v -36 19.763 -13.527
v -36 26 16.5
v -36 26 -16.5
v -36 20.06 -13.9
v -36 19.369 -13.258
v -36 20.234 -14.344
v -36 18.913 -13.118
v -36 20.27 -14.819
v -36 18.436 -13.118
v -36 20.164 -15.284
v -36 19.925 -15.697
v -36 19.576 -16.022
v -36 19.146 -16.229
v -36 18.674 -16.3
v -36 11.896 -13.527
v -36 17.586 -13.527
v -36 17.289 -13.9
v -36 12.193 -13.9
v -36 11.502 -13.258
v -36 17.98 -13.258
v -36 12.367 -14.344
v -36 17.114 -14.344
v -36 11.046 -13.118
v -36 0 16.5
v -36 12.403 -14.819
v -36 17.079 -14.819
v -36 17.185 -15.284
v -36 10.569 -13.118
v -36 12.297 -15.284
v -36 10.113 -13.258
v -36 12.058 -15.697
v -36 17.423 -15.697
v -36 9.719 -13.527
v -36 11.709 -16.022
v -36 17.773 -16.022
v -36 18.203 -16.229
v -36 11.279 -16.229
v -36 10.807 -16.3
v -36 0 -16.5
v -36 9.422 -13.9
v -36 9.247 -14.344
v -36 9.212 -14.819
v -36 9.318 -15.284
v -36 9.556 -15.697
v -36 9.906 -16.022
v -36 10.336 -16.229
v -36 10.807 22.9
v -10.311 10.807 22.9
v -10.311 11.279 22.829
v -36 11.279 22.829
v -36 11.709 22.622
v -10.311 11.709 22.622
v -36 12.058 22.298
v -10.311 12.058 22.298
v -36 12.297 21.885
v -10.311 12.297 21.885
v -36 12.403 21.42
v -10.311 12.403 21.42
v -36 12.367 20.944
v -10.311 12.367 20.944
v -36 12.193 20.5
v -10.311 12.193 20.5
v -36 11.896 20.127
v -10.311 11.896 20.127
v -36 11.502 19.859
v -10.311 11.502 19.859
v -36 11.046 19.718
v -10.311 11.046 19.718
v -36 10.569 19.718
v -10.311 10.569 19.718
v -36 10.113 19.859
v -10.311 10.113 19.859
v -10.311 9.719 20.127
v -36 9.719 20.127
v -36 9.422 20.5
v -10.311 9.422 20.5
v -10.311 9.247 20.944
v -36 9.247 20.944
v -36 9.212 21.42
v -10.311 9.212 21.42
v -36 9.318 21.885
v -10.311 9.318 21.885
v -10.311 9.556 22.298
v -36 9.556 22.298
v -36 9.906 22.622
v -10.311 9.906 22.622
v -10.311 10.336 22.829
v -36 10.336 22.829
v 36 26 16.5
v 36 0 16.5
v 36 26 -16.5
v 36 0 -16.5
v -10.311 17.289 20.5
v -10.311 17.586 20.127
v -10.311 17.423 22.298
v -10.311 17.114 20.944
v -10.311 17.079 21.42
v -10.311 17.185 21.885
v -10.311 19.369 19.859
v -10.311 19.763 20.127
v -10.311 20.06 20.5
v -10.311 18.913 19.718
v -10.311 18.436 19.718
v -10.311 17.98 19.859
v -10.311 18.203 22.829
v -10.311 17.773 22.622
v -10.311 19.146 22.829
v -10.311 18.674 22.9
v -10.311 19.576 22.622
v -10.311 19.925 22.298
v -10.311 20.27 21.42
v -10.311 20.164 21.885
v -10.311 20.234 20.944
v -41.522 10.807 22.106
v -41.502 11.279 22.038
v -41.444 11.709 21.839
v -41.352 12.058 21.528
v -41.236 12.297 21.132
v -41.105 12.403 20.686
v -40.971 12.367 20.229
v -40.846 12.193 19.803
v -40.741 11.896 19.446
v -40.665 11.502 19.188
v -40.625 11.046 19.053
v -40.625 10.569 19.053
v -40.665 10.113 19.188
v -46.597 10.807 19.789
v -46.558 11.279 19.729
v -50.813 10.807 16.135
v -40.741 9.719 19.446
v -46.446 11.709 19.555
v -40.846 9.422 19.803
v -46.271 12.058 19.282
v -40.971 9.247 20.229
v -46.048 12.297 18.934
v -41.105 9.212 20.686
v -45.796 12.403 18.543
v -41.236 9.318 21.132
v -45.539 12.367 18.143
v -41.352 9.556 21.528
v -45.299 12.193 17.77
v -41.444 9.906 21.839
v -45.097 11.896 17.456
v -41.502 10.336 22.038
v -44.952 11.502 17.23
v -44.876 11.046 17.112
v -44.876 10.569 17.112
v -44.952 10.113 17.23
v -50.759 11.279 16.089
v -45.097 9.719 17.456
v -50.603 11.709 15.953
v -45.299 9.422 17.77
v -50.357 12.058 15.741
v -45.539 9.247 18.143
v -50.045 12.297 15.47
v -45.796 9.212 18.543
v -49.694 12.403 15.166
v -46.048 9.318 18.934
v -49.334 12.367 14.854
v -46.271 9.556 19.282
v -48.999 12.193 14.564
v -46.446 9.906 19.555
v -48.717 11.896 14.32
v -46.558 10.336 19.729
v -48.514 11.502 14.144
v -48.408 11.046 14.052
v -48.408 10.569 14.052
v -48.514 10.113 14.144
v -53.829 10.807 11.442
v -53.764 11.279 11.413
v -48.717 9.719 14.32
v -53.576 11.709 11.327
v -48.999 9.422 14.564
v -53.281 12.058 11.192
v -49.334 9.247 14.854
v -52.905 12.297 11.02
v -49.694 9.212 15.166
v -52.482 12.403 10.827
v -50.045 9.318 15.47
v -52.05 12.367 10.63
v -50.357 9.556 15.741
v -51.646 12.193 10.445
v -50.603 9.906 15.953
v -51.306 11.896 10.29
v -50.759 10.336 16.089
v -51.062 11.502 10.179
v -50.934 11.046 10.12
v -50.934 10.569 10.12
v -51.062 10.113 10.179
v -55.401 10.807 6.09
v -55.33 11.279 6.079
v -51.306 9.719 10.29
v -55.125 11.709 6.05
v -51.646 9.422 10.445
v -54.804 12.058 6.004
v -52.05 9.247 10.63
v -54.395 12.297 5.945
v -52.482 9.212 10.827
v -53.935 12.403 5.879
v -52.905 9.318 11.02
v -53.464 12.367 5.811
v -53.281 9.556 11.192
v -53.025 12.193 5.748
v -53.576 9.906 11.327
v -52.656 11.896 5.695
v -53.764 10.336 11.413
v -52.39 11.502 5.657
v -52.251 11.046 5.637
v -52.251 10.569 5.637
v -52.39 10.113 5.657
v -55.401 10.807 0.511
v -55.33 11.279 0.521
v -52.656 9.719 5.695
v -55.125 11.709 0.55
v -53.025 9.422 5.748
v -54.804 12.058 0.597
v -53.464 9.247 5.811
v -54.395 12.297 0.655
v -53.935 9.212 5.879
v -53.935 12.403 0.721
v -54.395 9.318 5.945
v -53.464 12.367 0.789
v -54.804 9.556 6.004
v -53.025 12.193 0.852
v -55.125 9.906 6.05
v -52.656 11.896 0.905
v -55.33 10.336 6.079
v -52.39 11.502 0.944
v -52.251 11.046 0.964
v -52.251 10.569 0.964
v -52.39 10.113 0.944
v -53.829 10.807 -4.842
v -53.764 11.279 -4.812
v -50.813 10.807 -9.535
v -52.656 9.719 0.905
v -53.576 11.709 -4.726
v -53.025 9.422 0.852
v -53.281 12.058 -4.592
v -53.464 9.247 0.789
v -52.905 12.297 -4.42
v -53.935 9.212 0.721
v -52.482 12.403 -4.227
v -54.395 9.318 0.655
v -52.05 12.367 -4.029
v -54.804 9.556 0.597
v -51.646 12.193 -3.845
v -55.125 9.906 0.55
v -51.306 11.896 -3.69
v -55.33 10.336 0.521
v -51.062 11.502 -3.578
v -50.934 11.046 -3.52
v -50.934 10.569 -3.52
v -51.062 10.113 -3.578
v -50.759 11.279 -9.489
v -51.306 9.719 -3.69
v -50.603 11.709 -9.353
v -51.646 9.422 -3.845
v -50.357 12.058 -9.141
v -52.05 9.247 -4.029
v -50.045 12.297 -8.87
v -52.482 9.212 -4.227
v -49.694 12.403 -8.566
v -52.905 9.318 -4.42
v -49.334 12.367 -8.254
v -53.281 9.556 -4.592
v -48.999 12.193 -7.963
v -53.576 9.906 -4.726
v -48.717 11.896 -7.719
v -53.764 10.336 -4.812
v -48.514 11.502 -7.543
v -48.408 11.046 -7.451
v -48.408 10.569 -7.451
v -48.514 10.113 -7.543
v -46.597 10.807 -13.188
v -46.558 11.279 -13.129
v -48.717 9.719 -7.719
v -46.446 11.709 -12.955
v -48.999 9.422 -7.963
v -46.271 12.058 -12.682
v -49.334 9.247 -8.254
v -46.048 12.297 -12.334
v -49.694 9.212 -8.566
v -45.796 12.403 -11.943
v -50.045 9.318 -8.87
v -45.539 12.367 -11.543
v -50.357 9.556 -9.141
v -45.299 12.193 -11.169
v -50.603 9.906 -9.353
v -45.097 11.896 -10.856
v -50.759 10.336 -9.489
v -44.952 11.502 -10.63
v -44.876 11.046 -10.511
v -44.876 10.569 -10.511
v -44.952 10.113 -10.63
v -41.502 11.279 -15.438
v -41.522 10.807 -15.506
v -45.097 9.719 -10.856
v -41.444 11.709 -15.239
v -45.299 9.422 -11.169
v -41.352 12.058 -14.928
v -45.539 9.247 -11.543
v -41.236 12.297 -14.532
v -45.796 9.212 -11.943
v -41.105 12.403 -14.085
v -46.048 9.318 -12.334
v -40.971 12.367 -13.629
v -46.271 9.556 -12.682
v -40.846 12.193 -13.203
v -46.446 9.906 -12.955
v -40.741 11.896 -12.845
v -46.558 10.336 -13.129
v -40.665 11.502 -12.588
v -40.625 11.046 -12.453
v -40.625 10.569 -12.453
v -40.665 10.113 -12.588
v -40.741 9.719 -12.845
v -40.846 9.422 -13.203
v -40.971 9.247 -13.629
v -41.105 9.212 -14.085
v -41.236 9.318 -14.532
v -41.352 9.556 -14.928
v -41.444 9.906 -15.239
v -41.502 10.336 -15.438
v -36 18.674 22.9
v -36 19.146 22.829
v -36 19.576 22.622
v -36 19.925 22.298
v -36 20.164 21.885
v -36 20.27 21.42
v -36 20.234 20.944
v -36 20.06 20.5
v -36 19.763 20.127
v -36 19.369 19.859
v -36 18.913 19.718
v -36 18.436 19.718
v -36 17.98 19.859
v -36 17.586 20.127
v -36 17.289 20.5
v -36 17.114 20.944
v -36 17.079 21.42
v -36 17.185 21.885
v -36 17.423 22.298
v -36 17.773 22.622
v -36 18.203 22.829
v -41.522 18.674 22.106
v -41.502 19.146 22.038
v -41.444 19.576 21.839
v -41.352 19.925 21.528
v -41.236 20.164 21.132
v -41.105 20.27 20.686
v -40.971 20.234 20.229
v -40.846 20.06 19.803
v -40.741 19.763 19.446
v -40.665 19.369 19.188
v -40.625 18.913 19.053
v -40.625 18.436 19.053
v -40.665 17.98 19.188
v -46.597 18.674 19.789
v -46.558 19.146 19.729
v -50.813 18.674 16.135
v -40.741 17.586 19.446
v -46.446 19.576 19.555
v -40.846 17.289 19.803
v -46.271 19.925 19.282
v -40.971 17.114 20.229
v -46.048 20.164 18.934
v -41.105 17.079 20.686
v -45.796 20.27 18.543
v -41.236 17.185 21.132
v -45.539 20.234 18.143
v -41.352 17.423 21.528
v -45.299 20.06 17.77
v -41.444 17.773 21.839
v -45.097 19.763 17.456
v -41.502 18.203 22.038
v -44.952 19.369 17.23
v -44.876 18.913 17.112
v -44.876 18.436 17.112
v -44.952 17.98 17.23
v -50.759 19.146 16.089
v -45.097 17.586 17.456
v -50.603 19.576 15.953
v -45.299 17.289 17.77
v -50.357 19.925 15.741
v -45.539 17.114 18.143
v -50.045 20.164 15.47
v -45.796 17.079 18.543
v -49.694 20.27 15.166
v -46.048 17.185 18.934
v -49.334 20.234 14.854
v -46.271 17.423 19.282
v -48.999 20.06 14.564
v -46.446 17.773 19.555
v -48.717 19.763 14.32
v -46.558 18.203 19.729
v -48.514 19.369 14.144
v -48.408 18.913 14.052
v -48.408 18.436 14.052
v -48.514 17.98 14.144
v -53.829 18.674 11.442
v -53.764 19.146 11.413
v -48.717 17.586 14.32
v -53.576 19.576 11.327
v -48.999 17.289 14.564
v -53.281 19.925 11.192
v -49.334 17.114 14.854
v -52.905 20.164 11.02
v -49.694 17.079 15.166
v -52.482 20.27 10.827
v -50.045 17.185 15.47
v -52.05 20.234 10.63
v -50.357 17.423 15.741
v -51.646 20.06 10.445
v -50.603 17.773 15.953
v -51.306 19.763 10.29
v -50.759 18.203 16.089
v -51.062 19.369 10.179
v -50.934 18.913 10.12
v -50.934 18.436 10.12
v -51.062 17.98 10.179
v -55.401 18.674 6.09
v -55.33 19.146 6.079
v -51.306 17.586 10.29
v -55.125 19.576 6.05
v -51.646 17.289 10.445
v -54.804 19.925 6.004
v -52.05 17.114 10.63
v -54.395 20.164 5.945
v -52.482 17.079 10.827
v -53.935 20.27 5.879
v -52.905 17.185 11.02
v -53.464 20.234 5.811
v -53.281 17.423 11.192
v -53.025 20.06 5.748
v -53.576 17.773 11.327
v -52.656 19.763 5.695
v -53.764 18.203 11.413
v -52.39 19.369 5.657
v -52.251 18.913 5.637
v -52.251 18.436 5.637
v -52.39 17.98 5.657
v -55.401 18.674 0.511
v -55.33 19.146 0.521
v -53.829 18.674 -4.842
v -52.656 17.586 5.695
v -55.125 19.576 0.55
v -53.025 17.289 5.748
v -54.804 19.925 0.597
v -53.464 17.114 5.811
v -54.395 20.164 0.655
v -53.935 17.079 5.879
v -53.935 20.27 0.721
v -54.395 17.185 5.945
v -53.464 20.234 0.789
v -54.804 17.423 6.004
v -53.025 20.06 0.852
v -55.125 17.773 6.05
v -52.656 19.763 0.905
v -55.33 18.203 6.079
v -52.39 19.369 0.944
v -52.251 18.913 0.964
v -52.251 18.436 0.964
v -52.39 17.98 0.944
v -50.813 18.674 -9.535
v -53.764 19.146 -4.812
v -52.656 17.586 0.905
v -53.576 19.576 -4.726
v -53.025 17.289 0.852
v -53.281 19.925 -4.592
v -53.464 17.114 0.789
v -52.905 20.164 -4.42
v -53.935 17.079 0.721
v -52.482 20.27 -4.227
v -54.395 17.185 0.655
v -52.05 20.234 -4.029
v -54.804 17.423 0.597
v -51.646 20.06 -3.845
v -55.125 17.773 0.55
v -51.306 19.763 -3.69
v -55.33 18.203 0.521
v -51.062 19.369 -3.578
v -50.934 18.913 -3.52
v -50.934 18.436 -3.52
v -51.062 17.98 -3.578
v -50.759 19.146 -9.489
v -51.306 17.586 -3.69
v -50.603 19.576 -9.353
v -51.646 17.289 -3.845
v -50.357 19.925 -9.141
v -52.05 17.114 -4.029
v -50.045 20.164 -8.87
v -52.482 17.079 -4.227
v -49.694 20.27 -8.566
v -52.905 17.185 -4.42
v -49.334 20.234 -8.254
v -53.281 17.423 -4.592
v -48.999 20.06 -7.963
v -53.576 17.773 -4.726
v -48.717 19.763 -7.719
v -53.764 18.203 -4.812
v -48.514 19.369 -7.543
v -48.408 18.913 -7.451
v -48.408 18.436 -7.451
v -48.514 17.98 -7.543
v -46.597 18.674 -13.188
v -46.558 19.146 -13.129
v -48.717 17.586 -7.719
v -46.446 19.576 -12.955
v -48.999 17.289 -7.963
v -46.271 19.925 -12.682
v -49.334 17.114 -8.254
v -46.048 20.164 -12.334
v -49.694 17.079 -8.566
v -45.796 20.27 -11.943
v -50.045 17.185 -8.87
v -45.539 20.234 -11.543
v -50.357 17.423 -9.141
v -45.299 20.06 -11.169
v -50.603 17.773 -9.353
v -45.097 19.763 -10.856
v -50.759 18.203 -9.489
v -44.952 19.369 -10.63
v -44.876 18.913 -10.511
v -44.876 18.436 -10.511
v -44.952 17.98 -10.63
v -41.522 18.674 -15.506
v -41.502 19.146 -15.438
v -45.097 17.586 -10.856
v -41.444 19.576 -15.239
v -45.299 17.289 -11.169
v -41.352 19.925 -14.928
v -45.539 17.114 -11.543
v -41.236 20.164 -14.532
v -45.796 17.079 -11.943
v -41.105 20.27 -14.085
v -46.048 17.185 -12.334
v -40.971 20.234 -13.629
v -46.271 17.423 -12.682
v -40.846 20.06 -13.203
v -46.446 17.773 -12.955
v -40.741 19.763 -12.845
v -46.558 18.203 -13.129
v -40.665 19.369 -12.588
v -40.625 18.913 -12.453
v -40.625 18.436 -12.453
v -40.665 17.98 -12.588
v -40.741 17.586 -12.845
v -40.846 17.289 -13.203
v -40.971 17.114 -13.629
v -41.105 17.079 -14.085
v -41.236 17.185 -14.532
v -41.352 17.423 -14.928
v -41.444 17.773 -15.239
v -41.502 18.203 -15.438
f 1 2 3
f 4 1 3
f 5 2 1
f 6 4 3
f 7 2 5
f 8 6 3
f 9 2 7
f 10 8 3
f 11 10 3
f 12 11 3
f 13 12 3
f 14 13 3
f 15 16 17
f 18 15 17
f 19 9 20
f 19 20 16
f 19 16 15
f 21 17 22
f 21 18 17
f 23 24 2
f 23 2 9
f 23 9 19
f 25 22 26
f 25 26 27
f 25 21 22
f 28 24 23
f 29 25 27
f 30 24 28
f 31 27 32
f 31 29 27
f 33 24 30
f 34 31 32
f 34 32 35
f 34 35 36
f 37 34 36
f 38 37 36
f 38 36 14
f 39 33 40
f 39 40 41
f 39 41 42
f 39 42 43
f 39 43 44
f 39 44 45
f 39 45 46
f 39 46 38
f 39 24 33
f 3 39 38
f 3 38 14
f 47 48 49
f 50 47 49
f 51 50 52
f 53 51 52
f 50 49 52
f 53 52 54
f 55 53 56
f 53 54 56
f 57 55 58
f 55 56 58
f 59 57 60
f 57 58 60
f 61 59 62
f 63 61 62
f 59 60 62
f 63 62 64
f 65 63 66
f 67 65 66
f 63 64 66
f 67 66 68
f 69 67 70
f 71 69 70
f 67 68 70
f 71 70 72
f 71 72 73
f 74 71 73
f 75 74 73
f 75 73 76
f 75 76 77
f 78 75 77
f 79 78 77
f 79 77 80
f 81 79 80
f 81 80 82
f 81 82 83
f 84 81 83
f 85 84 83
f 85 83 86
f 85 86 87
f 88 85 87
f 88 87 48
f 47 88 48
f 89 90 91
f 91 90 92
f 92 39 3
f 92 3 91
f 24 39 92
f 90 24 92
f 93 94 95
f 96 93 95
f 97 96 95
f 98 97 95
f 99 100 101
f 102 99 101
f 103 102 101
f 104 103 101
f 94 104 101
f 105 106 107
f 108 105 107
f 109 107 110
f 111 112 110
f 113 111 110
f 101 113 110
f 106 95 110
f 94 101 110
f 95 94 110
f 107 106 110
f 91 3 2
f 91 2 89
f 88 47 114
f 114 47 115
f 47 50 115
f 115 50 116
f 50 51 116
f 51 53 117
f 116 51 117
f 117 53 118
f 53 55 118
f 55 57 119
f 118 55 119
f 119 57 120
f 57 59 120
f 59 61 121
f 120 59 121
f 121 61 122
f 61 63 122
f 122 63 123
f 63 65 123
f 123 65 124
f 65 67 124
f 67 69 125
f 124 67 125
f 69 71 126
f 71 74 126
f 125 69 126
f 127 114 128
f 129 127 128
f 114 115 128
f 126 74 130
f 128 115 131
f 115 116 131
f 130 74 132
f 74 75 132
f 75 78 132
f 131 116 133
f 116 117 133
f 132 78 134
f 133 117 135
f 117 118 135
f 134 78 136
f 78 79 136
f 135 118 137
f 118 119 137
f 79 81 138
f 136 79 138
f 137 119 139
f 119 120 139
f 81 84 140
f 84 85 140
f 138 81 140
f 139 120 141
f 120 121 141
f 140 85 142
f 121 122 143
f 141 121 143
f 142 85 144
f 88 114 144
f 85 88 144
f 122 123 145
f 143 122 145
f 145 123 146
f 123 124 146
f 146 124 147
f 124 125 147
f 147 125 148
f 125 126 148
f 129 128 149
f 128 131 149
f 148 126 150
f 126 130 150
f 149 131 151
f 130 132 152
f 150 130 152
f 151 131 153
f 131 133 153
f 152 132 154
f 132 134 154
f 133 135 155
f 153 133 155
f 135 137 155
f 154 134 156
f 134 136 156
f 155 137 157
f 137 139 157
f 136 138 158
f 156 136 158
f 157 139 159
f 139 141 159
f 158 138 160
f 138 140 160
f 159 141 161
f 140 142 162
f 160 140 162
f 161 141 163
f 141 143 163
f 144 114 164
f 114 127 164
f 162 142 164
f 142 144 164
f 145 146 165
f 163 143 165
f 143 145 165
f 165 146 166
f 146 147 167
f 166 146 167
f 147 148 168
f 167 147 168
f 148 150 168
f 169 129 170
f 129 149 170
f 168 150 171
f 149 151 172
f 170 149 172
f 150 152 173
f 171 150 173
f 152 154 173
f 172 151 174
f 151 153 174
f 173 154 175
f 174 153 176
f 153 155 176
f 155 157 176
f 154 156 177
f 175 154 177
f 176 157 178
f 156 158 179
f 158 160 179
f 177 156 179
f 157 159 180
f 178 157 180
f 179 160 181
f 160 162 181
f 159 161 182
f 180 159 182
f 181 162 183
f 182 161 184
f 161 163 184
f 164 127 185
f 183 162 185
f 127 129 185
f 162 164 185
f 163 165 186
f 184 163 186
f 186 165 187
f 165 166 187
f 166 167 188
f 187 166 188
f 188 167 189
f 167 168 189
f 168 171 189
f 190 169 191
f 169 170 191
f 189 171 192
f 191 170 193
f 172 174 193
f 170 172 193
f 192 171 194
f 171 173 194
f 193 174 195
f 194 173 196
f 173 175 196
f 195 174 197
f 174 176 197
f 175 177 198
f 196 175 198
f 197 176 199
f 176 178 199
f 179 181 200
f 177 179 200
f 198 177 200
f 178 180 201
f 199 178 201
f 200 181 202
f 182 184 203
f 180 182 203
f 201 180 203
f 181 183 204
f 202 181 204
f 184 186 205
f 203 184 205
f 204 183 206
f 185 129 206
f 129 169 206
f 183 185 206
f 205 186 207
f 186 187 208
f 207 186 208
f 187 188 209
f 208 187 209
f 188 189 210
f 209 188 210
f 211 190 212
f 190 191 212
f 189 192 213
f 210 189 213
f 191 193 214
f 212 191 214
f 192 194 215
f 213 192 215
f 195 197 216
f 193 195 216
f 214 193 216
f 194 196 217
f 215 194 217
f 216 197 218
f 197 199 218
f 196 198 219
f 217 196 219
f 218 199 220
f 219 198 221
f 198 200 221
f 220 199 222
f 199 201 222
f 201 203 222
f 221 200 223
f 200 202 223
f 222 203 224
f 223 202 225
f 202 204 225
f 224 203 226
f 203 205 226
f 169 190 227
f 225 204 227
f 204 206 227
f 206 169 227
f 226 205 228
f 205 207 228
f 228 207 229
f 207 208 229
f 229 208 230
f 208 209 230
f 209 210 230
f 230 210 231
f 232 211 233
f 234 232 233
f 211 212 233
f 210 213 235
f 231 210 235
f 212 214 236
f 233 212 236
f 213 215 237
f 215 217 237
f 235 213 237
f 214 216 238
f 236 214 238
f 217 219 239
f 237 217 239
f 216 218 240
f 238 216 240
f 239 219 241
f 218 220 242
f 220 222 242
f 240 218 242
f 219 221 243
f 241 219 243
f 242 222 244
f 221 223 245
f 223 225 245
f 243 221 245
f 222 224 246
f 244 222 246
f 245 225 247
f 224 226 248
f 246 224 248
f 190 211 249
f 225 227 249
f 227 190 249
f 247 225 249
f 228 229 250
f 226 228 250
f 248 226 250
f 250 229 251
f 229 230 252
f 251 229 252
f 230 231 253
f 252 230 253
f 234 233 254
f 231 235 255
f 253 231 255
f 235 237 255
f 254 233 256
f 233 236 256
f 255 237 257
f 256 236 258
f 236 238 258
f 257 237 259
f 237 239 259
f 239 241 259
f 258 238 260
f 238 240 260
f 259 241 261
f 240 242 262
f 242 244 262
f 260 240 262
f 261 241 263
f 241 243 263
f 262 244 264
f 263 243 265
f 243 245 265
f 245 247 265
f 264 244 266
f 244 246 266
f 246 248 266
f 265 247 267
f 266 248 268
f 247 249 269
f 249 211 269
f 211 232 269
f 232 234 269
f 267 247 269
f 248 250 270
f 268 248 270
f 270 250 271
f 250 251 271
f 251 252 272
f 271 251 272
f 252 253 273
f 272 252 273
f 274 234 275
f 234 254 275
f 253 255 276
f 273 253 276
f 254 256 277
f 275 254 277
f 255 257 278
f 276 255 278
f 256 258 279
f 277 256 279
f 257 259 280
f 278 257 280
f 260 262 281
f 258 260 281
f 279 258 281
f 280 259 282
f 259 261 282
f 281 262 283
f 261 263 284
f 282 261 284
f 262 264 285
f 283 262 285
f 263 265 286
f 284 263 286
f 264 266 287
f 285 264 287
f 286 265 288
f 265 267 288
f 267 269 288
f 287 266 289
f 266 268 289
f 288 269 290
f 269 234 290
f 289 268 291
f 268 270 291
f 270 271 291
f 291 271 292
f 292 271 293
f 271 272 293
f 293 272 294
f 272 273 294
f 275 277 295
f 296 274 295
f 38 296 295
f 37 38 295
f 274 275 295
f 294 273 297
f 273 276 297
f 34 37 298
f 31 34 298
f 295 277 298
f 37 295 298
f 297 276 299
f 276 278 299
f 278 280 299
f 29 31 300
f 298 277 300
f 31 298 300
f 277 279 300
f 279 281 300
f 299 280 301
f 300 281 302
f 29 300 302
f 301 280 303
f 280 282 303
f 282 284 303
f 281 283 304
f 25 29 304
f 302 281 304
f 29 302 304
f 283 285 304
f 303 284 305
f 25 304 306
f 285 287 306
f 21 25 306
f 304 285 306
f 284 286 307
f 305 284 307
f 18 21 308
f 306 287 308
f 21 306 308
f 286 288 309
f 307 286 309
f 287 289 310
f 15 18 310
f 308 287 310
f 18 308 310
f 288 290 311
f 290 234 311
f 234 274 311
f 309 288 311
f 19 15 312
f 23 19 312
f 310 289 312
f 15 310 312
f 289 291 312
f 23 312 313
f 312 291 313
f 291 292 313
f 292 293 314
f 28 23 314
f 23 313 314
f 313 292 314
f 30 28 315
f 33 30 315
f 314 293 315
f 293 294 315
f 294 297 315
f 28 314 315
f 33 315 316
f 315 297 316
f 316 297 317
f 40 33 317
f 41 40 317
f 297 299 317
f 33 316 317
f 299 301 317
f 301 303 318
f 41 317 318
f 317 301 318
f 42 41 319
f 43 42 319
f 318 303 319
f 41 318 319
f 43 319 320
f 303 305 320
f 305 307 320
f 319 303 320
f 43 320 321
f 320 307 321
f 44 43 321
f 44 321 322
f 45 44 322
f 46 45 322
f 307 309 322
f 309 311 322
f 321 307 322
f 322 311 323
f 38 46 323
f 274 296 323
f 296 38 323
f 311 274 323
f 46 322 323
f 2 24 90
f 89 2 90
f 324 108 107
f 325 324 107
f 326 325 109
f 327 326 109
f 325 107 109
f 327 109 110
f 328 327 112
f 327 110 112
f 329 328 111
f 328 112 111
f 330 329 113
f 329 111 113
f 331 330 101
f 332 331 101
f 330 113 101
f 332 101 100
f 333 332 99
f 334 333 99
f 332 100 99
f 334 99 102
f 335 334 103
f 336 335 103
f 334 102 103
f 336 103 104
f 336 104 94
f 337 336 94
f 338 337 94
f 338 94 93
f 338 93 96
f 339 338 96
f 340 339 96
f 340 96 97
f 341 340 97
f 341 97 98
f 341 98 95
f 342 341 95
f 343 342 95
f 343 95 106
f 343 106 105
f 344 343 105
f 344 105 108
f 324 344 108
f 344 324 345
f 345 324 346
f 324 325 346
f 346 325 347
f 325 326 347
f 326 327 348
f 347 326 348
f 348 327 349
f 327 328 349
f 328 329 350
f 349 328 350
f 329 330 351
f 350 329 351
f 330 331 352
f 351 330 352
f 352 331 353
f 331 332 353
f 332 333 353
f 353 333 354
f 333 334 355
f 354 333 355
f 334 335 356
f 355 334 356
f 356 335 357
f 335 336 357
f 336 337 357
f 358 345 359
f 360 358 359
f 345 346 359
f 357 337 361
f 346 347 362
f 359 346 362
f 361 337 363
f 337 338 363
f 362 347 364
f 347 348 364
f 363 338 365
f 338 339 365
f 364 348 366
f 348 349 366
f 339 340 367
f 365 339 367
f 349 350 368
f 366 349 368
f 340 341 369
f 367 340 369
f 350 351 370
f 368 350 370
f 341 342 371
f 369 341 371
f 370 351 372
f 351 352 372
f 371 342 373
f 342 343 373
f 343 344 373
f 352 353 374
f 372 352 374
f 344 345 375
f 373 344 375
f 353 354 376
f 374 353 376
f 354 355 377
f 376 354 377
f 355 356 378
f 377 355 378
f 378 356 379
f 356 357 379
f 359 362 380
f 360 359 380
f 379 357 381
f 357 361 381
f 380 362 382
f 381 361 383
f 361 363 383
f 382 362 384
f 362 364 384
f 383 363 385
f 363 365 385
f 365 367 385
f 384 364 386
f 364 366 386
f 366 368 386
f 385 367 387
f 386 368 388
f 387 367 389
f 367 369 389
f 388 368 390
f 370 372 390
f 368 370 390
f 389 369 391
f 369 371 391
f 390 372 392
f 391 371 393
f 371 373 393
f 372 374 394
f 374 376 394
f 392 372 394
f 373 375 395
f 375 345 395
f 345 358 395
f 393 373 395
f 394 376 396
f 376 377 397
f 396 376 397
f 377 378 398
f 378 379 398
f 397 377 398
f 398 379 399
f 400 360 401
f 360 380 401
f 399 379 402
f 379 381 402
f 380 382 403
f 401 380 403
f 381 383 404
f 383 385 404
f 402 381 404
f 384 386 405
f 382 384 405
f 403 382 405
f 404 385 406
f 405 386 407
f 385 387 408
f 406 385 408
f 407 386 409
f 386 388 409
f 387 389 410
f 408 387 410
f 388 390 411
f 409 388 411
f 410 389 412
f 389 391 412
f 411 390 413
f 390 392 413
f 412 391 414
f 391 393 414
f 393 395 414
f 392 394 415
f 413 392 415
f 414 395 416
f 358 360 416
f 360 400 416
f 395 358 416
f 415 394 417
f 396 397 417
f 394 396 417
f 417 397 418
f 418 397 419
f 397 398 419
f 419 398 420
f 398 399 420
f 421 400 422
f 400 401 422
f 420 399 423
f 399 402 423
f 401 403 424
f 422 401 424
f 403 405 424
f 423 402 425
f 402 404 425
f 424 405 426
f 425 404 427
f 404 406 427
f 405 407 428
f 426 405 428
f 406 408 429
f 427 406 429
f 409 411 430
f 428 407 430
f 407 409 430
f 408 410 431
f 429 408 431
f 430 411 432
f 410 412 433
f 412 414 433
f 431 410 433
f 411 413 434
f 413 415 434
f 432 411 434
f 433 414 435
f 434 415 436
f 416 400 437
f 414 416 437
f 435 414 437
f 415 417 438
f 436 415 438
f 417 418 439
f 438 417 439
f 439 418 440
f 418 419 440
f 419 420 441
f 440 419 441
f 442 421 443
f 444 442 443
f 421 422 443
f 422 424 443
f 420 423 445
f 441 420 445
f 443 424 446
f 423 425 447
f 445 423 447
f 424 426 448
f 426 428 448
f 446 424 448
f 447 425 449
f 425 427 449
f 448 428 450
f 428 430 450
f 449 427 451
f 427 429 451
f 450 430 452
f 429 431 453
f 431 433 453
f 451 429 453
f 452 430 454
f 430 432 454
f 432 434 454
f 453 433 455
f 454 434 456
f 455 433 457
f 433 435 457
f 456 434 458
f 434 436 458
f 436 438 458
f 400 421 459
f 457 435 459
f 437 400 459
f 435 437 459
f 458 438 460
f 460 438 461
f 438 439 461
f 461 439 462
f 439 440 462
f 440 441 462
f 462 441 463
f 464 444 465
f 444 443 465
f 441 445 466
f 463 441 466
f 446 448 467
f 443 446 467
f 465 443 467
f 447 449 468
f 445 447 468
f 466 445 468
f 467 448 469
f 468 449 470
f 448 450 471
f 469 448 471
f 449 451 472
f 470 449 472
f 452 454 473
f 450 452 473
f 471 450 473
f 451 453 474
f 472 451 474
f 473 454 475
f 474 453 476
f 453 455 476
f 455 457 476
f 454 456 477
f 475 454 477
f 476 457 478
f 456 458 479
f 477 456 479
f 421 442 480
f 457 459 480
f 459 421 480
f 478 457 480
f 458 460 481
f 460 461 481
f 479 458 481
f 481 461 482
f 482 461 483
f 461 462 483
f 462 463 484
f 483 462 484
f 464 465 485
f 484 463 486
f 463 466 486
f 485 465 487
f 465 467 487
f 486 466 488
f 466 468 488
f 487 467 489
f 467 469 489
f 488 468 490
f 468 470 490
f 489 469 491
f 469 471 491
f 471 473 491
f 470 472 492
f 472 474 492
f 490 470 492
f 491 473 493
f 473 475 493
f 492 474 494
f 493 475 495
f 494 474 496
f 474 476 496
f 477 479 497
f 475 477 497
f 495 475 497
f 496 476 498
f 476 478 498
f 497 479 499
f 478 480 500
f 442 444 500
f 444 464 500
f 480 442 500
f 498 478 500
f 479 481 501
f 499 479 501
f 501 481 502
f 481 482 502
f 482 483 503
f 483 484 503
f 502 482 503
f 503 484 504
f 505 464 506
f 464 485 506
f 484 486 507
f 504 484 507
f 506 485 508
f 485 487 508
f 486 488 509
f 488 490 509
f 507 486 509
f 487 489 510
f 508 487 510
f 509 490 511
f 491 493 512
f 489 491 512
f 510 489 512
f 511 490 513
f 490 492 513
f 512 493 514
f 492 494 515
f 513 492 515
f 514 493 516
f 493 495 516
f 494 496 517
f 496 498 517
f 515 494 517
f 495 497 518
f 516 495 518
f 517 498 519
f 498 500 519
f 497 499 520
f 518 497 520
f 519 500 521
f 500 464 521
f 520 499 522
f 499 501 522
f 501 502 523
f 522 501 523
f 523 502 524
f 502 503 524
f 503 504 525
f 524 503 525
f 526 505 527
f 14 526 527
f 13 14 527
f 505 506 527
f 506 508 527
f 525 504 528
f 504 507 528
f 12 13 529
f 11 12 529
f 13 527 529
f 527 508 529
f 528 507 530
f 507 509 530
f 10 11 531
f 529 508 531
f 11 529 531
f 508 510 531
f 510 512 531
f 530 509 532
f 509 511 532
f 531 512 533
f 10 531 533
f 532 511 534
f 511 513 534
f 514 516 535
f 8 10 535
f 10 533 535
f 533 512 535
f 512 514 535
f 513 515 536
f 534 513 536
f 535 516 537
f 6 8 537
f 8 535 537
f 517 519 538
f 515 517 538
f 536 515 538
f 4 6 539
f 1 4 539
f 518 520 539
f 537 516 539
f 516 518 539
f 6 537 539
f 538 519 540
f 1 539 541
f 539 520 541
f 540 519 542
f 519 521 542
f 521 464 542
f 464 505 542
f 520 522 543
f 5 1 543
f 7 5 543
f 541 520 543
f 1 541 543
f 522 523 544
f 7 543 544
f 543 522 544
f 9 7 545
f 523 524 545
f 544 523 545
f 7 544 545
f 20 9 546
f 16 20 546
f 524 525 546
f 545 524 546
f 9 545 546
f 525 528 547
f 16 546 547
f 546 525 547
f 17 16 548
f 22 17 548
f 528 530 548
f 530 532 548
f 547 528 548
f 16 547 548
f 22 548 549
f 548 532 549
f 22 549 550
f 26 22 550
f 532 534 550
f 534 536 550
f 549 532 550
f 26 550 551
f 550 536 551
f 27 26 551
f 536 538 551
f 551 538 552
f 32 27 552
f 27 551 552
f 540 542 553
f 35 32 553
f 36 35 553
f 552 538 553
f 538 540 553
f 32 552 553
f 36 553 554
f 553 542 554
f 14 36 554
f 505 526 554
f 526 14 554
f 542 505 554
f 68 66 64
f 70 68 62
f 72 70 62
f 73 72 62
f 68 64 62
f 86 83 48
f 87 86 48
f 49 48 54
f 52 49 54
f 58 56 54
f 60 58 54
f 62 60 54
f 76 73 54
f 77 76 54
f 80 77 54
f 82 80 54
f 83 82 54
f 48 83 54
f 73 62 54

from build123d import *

# Parameters (mm, degrees)
ESQUISSE1_W          = 72
ESQUISSE1_H          = 33
BOSS_EXTRU_1_DEPTH   = 26
ESQUISSE3_R          = 1.6
BOSS_EXTRU_2_DEPTH   = 25.689186
BOSS_EXTRU_2_2_DEPTH = 25.689186
ESQUISSE4_R          = 1.6
R_VOLUTION1_ANGLE    = 180


with BuildPart() as part:
    # Esquisse1 → Boss.-Extru.1 (new body)
    with BuildSketch(Plane(origin=(0, 0, 0), x_dir=(1, 0, 0), z_dir=(0, 1, 0))):
        Rectangle(ESQUISSE1_W, ESQUISSE1_H)
    extrude(amount=BOSS_EXTRU_1_DEPTH)



with BuildPart() as body_2:
    # Esquisse3 → Boss.-Extru.2 (new body)
    with BuildSketch(Plane.ZY.offset(10.310814339)):
        with Locations((21.300154865, 18.67433682)):
            Circle(ESQUISSE3_R)
    extrude(amount=BOSS_EXTRU_2_DEPTH)


with BuildPart() as body_3:
    # Esquisse3 → Boss.-Extru.2 2 (new body)
    with BuildSketch(Plane.ZY.offset(10.310814339)):
        with Locations((21.300154865, 10.80733682)):
            Circle(ESQUISSE3_R)
    extrude(amount=BOSS_EXTRU_2_2_DEPTH)


with BuildPart() as part_1:
    add(part.part)

    add(body_2.part)  # Révolution1 merges body 2

    add(body_3.part)  # Révolution1 merges body 3
    # Esquisse4 → Révolution1 (revolve)
    with BuildSketch(Plane.ZY.offset(36)):
        with Locations((21.300154865, 18.67433682)):
            Circle(ESQUISSE4_R)
        with Locations((21.300154865, 10.80733682)):
            Circle(ESQUISSE4_R)
    revolve(axis=Axis((-36, 26, 3.300154865), (0, -1, 0)), revolution_arc=R_VOLUTION1_ANGLE)


solid = part_1.part
